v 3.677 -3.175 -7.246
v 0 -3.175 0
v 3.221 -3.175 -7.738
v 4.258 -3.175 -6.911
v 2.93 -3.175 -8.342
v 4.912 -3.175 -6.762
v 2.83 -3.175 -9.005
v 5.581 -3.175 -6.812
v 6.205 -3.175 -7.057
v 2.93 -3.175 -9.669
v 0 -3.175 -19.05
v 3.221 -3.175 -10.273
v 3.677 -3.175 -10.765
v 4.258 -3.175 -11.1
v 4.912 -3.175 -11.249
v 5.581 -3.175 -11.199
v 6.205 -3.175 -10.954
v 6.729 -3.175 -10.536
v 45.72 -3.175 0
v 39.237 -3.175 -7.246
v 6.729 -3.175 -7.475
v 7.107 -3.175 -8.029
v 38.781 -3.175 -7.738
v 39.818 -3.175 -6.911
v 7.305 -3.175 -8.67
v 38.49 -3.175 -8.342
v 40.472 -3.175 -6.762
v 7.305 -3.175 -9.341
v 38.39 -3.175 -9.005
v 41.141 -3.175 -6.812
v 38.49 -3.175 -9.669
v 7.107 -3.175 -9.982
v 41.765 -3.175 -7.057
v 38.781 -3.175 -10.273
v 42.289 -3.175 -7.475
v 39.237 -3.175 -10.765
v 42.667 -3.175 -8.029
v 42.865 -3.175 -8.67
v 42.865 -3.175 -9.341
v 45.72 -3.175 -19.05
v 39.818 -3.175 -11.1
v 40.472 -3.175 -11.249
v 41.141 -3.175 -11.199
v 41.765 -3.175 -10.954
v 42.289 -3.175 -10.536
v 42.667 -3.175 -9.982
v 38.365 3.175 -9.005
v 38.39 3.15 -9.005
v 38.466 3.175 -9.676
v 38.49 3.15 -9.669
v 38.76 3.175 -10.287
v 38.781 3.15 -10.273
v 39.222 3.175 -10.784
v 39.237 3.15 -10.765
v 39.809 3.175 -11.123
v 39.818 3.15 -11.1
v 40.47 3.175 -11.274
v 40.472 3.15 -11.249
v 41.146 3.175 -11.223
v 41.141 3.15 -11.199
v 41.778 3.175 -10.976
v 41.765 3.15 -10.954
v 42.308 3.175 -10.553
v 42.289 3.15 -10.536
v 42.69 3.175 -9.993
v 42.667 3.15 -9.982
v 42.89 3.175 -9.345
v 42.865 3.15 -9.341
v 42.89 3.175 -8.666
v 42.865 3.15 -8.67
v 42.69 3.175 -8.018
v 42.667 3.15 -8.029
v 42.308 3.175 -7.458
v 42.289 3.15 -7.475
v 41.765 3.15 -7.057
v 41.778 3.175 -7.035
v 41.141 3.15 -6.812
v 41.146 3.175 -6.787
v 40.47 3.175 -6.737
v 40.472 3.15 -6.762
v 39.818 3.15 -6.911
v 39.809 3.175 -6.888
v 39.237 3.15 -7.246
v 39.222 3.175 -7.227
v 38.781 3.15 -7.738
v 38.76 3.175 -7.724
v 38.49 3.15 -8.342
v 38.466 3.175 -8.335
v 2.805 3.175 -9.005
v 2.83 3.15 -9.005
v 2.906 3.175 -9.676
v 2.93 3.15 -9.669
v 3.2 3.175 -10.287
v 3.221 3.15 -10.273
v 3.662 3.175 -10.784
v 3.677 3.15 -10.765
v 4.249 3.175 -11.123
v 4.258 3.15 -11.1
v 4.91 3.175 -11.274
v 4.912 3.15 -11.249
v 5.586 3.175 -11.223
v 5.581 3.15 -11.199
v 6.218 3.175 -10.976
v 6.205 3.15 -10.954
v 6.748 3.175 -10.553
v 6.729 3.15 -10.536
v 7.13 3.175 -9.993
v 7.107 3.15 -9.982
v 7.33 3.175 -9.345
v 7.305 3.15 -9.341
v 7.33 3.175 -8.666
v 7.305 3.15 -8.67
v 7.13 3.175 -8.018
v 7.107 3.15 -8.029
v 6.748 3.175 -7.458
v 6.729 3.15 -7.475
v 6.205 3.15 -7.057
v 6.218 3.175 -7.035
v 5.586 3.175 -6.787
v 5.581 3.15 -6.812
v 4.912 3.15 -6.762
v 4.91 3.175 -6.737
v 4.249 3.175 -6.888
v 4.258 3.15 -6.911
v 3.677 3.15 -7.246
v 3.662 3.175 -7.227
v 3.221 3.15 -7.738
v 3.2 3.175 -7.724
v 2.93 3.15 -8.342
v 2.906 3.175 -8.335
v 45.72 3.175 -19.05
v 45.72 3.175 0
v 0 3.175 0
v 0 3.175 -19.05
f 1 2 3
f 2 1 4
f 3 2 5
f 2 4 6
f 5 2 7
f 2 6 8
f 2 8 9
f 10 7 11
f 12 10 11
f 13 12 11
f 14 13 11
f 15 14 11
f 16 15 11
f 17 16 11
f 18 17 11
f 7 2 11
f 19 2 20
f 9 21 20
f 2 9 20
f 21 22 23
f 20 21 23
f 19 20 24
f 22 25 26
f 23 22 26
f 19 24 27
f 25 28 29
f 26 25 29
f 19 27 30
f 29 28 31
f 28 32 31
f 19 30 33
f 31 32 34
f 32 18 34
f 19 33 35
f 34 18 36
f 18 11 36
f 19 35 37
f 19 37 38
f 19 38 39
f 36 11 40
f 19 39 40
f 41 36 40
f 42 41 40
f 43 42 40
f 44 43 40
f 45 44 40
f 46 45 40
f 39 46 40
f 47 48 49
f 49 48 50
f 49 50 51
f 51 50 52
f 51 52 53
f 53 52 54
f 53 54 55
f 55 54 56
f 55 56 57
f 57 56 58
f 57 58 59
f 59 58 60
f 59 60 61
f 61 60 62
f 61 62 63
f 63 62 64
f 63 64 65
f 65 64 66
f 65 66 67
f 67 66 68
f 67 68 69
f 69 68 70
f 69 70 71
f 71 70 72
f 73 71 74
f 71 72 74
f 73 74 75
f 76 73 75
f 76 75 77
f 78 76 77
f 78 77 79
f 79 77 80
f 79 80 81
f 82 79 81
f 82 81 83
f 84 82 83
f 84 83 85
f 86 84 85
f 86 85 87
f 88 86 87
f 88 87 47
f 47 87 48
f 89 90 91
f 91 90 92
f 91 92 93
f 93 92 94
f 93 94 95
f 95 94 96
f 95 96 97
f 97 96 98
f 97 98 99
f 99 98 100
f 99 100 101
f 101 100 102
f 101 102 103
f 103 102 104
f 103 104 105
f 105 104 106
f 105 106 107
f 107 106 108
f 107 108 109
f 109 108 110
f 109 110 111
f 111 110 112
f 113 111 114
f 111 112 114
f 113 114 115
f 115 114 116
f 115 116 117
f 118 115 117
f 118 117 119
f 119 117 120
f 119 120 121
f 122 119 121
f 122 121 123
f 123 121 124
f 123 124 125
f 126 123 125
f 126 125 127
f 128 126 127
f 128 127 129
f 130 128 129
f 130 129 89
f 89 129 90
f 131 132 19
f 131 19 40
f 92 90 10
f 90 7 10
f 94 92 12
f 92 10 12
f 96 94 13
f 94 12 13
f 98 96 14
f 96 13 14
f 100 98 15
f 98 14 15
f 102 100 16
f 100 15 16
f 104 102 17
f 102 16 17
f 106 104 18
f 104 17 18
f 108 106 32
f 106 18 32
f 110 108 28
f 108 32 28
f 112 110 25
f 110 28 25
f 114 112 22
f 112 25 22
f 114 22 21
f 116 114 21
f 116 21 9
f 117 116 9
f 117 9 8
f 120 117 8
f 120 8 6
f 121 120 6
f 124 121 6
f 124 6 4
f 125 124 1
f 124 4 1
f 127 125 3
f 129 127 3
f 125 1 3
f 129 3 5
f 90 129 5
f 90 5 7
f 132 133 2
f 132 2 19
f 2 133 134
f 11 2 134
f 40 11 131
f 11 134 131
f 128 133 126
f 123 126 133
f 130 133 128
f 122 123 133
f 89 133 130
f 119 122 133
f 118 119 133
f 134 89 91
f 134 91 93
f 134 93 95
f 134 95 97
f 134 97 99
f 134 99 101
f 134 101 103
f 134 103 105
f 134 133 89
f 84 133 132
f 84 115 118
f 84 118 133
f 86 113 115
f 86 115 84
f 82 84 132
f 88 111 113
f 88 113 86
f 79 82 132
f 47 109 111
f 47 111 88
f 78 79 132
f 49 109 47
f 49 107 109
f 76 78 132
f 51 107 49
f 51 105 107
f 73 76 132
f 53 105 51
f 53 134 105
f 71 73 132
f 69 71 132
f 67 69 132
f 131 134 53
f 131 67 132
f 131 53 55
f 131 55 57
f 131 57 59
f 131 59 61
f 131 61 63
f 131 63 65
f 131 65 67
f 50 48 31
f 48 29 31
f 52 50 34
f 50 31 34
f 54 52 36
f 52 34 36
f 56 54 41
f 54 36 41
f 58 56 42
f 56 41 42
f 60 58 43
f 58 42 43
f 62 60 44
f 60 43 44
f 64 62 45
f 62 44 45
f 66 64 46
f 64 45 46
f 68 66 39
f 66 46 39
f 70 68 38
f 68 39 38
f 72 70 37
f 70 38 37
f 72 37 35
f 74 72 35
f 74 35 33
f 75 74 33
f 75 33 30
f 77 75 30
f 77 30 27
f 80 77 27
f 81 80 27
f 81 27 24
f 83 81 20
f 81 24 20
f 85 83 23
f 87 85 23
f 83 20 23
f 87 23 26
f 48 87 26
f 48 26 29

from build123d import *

# Parameters (mm, degrees)
SKETCH1_W                      = 45.72
SKETCH1_H                      = 19.05
BOSS_EXTRUDE1_DEPTH            = 3.175
M4_CLEARANCE_HOLE1_D           = 4.5
M4_CLEARANCE_HOLE1_CSINK_D     = 4.55
M4_CLEARANCE_HOLE1_CSINK_ANGLE = 90


with BuildPart() as part:
    # Sketch1 → Boss-Extrude1 (new, symmetric)
    with BuildSketch(Plane(origin=(0, 0, 0), x_dir=(1, 0, 0), z_dir=(0, 1, 0))):
        with Locations((22.86, 9.525)):
            Rectangle(SKETCH1_W, SKETCH1_H)
    extrude(amount=BOSS_EXTRUDE1_DEPTH, both=True)

    # M4 Clearance Hole1 (through all)
    with Locations(Plane(origin=(0, 3.175, 0), x_dir=(1, 0, 0), z_dir=(0, 1, 0))):
        with Locations((5.08, 9.005429498), (40.64, 9.005429498)):
            CounterSinkHole(M4_CLEARANCE_HOLE1_D / 2, M4_CLEARANCE_HOLE1_CSINK_D / 2, counter_sink_angle=M4_CLEARANCE_HOLE1_CSINK_ANGLE)


solid = part.part
